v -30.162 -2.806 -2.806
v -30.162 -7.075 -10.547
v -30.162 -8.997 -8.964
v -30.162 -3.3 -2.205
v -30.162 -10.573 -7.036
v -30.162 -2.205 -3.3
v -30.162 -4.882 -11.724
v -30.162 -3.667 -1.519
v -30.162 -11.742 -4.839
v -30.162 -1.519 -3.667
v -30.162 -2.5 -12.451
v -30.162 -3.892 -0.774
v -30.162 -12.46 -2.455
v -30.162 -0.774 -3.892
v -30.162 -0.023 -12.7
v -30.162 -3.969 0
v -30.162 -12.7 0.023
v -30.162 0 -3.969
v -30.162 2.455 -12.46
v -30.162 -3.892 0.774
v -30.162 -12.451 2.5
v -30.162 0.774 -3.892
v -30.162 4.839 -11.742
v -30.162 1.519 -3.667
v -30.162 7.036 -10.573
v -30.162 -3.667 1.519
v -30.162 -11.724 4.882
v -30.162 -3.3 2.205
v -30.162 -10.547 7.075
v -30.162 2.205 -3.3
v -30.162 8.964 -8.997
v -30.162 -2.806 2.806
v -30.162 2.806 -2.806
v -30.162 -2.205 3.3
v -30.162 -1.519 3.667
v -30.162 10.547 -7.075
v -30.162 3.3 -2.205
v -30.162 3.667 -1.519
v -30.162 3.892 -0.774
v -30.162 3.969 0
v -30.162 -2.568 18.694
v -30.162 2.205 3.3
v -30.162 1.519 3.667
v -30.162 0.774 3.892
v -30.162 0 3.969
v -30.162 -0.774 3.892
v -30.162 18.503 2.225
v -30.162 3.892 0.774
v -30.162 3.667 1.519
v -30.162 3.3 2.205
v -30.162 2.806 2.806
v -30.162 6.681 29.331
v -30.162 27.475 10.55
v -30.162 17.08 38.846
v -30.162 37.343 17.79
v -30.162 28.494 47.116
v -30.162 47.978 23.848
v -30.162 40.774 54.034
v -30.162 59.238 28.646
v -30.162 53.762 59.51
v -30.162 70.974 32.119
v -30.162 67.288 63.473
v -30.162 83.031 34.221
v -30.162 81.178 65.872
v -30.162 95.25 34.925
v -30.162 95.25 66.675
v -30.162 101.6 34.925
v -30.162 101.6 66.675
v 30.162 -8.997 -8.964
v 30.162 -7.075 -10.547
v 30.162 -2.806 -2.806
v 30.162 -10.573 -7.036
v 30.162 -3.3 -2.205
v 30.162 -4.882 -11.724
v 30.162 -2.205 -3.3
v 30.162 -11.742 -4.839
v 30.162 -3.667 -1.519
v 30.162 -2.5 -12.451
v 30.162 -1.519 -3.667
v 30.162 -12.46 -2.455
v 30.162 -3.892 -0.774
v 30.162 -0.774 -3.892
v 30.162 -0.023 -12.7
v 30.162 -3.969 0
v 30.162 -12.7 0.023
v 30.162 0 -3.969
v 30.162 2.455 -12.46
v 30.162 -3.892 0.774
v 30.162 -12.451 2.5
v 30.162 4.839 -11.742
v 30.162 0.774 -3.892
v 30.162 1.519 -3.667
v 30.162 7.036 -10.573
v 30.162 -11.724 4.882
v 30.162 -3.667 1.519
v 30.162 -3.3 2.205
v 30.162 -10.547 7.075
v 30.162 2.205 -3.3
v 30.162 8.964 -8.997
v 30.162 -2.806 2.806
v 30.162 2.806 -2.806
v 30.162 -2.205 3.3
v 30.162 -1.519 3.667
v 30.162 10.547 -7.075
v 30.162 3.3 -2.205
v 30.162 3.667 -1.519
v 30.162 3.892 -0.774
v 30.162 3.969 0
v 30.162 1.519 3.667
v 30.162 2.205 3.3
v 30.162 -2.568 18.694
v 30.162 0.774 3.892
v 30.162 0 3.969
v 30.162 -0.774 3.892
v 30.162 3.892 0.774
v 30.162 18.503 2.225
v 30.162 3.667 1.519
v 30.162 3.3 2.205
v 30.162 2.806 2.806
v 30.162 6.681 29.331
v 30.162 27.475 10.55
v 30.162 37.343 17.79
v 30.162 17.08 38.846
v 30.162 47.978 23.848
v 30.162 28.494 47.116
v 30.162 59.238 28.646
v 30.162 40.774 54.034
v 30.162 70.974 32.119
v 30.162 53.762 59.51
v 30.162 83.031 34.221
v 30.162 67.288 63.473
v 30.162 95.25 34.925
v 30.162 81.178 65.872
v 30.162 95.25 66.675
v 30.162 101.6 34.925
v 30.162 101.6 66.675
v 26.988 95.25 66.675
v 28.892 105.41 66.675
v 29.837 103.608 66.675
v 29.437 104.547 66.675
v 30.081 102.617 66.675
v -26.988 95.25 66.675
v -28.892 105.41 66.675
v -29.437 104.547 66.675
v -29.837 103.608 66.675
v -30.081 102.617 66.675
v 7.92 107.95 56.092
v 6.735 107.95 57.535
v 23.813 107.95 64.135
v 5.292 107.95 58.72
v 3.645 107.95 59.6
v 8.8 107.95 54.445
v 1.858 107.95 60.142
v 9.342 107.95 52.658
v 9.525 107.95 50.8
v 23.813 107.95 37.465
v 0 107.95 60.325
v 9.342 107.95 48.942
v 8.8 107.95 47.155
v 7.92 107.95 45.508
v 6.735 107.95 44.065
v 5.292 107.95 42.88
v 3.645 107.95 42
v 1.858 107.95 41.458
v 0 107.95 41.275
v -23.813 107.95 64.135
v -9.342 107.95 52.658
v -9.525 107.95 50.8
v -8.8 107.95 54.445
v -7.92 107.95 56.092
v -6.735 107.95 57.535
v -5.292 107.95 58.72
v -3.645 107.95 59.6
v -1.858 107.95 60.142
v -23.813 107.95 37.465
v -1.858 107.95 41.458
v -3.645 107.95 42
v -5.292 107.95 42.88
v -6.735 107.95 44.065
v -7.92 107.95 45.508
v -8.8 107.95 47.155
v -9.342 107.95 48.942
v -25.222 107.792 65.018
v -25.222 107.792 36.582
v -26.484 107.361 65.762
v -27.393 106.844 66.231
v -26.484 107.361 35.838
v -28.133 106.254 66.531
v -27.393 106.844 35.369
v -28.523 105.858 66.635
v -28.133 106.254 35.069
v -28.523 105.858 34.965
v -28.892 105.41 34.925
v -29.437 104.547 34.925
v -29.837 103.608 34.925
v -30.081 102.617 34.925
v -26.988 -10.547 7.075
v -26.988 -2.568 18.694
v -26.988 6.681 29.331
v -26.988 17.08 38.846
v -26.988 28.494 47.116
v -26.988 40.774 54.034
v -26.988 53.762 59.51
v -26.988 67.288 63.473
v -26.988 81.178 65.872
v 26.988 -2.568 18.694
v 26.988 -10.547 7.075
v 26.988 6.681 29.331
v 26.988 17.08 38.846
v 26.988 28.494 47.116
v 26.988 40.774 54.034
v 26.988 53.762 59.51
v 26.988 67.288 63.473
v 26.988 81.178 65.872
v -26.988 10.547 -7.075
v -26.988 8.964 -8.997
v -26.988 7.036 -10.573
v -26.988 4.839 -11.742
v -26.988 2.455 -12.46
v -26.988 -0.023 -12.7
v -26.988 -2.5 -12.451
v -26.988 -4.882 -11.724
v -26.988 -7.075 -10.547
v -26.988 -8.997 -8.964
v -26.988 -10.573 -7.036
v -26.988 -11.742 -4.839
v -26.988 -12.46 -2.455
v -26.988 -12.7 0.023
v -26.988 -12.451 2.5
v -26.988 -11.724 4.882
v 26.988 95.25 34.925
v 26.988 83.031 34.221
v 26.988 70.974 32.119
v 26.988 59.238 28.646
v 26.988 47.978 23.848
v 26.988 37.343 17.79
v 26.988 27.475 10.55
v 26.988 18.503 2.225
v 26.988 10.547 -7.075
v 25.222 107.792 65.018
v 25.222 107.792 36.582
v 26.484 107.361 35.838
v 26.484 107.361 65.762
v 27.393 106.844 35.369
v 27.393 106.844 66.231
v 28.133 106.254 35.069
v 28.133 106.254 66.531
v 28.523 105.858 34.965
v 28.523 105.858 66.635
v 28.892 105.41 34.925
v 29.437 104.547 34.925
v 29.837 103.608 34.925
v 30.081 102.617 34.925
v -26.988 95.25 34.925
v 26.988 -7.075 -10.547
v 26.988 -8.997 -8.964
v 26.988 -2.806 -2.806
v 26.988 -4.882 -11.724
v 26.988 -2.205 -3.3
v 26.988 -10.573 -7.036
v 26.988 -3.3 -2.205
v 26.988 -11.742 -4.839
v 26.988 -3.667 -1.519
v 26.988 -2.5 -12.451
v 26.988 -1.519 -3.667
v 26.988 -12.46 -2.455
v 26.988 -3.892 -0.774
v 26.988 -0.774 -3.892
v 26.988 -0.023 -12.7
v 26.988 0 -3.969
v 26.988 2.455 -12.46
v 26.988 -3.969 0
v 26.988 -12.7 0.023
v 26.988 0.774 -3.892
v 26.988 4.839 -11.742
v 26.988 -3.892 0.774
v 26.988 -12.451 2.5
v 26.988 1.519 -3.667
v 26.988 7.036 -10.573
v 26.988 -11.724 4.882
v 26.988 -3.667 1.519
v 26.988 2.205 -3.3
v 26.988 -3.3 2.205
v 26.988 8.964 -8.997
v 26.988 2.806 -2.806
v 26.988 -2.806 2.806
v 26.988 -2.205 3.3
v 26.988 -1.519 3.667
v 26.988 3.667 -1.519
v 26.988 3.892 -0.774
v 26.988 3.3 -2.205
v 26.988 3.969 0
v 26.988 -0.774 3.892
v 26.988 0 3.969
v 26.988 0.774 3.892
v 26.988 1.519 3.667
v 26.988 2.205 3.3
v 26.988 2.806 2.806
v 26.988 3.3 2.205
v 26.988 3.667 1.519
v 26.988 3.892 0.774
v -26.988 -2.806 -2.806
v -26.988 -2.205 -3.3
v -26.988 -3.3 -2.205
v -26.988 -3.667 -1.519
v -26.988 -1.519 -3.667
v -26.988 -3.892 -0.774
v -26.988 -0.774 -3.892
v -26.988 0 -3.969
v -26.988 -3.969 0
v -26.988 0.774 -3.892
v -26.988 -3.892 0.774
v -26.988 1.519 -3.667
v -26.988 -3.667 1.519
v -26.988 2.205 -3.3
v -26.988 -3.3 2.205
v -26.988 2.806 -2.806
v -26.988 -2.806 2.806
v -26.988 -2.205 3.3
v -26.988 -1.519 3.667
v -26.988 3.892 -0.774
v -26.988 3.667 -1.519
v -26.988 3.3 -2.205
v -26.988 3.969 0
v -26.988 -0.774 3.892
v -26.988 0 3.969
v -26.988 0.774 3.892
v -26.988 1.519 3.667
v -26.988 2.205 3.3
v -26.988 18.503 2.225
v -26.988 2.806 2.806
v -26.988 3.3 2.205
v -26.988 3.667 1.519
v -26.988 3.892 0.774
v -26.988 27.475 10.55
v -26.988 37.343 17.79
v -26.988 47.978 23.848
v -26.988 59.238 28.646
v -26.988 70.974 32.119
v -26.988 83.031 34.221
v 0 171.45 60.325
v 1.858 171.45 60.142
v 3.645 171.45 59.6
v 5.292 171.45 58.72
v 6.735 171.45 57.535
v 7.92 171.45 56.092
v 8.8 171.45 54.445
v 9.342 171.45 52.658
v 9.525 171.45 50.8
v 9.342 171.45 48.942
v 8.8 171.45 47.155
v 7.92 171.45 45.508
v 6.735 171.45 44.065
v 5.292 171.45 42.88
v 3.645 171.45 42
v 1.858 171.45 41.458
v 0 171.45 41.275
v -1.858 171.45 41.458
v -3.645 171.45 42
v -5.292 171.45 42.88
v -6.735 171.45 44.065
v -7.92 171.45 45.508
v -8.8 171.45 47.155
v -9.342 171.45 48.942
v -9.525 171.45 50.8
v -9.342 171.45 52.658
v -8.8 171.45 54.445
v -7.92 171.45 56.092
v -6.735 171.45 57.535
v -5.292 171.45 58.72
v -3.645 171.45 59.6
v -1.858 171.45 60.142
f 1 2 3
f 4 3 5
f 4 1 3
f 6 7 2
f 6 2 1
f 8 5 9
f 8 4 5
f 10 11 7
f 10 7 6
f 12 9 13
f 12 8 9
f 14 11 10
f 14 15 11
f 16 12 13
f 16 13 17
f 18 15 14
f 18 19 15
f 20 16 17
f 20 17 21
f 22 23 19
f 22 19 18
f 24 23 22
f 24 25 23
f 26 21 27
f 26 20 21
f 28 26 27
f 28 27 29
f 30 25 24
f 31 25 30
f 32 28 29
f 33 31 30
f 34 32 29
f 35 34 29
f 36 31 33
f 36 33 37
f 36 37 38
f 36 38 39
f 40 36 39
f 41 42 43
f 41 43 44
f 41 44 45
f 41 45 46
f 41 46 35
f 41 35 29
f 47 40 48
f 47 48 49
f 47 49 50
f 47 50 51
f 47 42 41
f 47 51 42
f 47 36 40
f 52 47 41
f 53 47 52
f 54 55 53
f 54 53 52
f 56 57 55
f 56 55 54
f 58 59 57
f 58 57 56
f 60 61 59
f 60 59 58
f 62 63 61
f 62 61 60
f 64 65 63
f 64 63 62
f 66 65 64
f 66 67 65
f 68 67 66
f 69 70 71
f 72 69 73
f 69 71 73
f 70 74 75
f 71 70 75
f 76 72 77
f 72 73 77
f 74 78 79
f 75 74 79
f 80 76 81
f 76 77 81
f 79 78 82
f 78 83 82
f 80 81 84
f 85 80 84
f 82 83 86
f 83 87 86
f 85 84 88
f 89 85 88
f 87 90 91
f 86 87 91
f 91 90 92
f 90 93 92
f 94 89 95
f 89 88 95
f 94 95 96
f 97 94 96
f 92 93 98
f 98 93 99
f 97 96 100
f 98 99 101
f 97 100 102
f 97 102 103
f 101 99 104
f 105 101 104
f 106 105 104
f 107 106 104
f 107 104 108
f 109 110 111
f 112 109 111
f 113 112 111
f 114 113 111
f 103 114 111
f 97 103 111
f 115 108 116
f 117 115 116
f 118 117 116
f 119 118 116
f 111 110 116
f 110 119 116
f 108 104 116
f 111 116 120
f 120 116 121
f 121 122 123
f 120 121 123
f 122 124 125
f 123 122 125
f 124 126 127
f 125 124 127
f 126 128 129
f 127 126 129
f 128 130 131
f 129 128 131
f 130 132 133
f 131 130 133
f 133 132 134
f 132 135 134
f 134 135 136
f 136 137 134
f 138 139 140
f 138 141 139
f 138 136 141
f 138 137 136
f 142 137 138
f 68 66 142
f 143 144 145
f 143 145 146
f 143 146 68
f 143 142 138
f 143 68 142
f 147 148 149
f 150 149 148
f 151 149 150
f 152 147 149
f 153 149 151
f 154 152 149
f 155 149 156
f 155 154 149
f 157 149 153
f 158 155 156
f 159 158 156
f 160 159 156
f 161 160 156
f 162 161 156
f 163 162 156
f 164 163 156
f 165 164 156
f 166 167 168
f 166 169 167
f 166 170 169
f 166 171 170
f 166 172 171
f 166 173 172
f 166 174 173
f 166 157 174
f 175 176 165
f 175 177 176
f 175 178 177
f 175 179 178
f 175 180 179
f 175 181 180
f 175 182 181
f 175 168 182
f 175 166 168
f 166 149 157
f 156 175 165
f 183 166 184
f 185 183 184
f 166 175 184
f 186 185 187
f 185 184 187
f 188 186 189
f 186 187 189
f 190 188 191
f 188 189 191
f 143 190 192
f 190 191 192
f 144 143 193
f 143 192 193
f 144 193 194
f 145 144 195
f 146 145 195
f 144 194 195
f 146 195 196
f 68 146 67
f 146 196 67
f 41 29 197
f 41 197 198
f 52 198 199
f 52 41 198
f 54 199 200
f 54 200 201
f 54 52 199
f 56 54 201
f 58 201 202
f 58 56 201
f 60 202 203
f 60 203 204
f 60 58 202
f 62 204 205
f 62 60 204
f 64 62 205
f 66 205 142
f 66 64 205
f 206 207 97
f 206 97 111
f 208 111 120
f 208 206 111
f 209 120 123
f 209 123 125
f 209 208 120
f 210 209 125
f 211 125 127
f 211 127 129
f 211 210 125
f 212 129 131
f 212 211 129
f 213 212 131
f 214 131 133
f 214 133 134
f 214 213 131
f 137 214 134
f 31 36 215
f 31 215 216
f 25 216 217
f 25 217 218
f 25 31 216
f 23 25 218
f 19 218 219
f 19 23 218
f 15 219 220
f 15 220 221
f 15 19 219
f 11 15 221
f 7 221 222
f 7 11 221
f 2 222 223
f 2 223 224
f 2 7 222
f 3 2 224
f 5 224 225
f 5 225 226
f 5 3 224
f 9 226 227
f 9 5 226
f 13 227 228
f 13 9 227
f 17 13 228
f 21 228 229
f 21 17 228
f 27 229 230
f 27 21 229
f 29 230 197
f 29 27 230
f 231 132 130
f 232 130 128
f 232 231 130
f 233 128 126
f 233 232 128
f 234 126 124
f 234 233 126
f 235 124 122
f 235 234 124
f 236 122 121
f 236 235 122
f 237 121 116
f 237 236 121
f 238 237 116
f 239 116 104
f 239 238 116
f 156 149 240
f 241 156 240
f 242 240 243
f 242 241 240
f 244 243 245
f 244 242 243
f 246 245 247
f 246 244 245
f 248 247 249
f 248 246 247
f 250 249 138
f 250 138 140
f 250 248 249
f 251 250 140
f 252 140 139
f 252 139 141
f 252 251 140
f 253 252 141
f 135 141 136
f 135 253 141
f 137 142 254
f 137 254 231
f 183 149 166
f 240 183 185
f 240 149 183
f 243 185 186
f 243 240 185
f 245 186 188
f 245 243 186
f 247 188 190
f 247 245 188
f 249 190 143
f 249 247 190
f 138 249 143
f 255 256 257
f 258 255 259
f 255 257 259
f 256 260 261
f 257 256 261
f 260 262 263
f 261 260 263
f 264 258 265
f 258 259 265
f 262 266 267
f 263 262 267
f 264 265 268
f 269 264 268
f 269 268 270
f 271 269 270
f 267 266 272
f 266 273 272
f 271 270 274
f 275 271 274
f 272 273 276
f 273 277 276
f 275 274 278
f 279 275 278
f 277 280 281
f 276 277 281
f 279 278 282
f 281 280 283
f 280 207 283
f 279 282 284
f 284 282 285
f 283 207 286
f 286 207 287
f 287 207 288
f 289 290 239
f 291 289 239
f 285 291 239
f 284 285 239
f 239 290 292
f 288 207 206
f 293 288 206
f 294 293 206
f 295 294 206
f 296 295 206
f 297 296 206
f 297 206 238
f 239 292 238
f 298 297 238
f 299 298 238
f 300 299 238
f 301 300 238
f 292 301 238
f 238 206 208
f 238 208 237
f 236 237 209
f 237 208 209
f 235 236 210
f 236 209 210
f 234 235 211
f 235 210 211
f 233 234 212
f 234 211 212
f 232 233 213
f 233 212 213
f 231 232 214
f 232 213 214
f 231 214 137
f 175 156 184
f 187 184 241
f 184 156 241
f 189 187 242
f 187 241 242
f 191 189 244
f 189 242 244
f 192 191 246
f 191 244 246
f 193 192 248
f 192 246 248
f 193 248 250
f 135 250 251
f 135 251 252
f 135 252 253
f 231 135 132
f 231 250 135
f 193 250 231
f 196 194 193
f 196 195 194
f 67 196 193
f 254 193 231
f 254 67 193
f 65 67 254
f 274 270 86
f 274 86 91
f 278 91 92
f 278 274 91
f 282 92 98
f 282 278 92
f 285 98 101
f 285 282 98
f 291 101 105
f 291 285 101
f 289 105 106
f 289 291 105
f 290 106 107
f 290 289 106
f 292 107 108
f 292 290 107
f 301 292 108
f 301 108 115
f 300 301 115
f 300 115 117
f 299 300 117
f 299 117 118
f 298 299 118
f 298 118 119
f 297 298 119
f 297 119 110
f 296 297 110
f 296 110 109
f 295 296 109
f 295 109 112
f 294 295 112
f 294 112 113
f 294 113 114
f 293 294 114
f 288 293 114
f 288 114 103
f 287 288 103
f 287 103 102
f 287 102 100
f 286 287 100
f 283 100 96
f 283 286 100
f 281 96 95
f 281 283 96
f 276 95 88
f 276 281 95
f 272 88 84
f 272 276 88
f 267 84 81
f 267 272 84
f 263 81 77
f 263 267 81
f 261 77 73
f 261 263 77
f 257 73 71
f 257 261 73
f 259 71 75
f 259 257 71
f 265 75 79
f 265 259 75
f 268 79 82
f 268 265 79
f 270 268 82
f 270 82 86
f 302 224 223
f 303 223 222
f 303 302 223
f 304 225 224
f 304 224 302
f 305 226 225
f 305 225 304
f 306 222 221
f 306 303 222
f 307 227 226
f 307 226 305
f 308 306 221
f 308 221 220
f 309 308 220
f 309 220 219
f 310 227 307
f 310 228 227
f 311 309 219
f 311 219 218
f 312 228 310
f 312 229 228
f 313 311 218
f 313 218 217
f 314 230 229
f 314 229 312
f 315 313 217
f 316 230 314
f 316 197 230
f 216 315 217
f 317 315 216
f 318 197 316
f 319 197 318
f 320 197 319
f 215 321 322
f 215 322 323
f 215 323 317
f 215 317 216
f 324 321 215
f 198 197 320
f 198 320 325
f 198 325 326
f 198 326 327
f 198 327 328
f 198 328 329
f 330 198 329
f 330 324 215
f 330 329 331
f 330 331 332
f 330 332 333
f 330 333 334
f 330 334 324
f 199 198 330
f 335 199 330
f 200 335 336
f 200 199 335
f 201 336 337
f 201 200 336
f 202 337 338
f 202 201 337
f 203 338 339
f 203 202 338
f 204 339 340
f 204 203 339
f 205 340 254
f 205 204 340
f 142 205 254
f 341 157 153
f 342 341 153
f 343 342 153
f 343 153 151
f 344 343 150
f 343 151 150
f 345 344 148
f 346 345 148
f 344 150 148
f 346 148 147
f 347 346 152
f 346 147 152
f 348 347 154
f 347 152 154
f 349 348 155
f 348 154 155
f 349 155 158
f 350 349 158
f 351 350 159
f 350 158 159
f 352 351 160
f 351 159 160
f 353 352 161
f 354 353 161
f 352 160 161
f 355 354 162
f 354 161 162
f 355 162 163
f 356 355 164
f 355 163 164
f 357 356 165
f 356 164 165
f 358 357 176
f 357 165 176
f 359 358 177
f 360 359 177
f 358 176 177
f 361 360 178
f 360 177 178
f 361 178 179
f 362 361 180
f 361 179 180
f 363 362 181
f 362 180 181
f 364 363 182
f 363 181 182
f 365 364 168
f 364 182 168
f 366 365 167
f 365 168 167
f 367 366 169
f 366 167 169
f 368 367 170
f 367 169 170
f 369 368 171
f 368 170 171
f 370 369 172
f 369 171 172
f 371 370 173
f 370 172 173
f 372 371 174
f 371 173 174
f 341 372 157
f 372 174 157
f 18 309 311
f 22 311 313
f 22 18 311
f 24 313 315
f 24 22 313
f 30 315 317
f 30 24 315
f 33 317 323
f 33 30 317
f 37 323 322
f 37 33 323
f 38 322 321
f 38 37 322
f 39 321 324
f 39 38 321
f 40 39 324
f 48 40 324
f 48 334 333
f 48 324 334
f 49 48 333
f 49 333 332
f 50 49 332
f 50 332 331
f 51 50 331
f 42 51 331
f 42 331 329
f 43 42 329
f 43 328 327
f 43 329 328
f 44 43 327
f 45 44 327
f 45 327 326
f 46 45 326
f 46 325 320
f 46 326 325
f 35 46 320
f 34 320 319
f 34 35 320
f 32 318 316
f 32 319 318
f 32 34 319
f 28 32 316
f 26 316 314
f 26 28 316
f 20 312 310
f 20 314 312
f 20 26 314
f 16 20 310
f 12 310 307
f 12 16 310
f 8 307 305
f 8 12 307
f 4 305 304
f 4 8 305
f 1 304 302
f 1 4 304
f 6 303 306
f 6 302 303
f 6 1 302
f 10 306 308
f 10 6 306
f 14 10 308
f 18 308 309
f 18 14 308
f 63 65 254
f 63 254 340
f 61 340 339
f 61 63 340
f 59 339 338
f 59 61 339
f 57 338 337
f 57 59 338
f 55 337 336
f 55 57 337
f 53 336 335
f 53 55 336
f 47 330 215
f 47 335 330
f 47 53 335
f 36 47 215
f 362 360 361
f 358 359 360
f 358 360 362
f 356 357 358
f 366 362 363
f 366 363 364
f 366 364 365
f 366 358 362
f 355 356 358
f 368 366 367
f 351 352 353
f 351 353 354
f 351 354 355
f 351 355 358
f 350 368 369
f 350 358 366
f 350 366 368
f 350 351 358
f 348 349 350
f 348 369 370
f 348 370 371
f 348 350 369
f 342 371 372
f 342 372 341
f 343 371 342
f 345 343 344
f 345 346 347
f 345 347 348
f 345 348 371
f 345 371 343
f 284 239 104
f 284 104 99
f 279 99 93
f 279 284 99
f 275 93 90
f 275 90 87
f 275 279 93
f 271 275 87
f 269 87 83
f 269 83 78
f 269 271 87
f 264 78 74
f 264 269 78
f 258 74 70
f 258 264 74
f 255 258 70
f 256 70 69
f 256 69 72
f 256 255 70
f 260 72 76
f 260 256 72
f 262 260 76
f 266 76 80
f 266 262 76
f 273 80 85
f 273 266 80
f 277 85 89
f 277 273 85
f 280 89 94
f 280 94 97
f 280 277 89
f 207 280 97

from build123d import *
from OCP.BRepFilletAPI import BRepFilletAPI_MakeFillet

# Parameters (mm, degrees)
BOSS_EXTRUDE1_DEPTH      = 30.1625
BOSS_EXTRUDE1_DEPTH_BACK = 30.1625
SKETCH1_R                = 3.96875
SKETCH2_W                = 53.975
SKETCH2_H                = 127
CUT_EXTRUDE1_DEPTH       = 138.343982508
SKETCH3_R                = 9.525
BOSS_EXTRUDE2_DEPTH      = 63.5
FILLET5_R1               = 6.35
FILLET5_R2               = 2.54


with BuildPart() as part:
    # Sketch1 → Boss-Extrude1 (new, two sides: drawn at the far end of the back side and taken through both)
    with BuildSketch(Plane(origin=(0, 0, 0), x_dir=(0, 0, -1), z_dir=(1, 0, 0)).offset(-BOSS_EXTRUDE1_DEPTH_BACK)):
        with BuildLine():
            Line((-66.675, 107.95), (-34.925, 107.95))
            Line((-34.925, 107.95), (-34.925, 95.25))
            ThreePointArc((-34.925, 95.25), (-23.848499799, 47.977772084), (7.075086505, 10.546712803))
            ThreePointArc((7.075086505, 10.546712803), (10.546712803, -7.075086505), (-7.075086505, -10.546712803))
            ThreePointArc((-7.075086505, -10.546712803), (-50.749935163, 34.535310409), (-66.675, 95.25))
            Line((-66.675, 95.25), (-66.675, 107.95))
        make_face()
        Circle(SKETCH1_R, mode=Mode.SUBTRACT)
    extrude(amount=BOSS_EXTRUDE1_DEPTH + BOSS_EXTRUDE1_DEPTH_BACK)

    # Sketch2 → Cut-Extrude1 (cut, through all)
    with BuildSketch(Plane.XY.offset(66.675)):
        with Locations((0, 31.75)):
            Rectangle(SKETCH2_W, SKETCH2_H)
    extrude(amount=-CUT_EXTRUDE1_DEPTH, mode=Mode.SUBTRACT)

    # Sketch3 → Boss-Extrude2 (add)
    with BuildSketch(Plane(origin=(0, 107.95, 0), x_dir=(1, 0, 0), z_dir=(0, 1, 0))):
        with Locations((0, -50.8)):
            Circle(SKETCH3_R)
    extrude(amount=BOSS_EXTRUDE2_DEPTH)

    # Fillet5: one fillet with a radius per group of edges: ONE call of the kernel's fillet builder (fillet() takes one radius for all edges)
    fillet5_edges_1 = [part.edges().sort_by_distance(p)[0] for p in [
        (-30.1625, 107.95, 50.8),
        (30.1625, 107.95, 50.8),
    ]]
    fillet5_edges_2 = [part.edges().sort_by_distance(p)[0] for p in [
        (0, 107.95, 34.925),
        (0, 107.95, 66.675),
    ]]
    fillet5 = BRepFilletAPI_MakeFillet(part.part.solid().wrapped)
    for e in fillet5_edges_1:
        fillet5.Add(FILLET5_R1, e.wrapped)
    for e in fillet5_edges_2:
        fillet5.Add(FILLET5_R2, e.wrapped)
    add(Compound.cast(fillet5.Shape()), mode=Mode.REPLACE)


solid = part.part
